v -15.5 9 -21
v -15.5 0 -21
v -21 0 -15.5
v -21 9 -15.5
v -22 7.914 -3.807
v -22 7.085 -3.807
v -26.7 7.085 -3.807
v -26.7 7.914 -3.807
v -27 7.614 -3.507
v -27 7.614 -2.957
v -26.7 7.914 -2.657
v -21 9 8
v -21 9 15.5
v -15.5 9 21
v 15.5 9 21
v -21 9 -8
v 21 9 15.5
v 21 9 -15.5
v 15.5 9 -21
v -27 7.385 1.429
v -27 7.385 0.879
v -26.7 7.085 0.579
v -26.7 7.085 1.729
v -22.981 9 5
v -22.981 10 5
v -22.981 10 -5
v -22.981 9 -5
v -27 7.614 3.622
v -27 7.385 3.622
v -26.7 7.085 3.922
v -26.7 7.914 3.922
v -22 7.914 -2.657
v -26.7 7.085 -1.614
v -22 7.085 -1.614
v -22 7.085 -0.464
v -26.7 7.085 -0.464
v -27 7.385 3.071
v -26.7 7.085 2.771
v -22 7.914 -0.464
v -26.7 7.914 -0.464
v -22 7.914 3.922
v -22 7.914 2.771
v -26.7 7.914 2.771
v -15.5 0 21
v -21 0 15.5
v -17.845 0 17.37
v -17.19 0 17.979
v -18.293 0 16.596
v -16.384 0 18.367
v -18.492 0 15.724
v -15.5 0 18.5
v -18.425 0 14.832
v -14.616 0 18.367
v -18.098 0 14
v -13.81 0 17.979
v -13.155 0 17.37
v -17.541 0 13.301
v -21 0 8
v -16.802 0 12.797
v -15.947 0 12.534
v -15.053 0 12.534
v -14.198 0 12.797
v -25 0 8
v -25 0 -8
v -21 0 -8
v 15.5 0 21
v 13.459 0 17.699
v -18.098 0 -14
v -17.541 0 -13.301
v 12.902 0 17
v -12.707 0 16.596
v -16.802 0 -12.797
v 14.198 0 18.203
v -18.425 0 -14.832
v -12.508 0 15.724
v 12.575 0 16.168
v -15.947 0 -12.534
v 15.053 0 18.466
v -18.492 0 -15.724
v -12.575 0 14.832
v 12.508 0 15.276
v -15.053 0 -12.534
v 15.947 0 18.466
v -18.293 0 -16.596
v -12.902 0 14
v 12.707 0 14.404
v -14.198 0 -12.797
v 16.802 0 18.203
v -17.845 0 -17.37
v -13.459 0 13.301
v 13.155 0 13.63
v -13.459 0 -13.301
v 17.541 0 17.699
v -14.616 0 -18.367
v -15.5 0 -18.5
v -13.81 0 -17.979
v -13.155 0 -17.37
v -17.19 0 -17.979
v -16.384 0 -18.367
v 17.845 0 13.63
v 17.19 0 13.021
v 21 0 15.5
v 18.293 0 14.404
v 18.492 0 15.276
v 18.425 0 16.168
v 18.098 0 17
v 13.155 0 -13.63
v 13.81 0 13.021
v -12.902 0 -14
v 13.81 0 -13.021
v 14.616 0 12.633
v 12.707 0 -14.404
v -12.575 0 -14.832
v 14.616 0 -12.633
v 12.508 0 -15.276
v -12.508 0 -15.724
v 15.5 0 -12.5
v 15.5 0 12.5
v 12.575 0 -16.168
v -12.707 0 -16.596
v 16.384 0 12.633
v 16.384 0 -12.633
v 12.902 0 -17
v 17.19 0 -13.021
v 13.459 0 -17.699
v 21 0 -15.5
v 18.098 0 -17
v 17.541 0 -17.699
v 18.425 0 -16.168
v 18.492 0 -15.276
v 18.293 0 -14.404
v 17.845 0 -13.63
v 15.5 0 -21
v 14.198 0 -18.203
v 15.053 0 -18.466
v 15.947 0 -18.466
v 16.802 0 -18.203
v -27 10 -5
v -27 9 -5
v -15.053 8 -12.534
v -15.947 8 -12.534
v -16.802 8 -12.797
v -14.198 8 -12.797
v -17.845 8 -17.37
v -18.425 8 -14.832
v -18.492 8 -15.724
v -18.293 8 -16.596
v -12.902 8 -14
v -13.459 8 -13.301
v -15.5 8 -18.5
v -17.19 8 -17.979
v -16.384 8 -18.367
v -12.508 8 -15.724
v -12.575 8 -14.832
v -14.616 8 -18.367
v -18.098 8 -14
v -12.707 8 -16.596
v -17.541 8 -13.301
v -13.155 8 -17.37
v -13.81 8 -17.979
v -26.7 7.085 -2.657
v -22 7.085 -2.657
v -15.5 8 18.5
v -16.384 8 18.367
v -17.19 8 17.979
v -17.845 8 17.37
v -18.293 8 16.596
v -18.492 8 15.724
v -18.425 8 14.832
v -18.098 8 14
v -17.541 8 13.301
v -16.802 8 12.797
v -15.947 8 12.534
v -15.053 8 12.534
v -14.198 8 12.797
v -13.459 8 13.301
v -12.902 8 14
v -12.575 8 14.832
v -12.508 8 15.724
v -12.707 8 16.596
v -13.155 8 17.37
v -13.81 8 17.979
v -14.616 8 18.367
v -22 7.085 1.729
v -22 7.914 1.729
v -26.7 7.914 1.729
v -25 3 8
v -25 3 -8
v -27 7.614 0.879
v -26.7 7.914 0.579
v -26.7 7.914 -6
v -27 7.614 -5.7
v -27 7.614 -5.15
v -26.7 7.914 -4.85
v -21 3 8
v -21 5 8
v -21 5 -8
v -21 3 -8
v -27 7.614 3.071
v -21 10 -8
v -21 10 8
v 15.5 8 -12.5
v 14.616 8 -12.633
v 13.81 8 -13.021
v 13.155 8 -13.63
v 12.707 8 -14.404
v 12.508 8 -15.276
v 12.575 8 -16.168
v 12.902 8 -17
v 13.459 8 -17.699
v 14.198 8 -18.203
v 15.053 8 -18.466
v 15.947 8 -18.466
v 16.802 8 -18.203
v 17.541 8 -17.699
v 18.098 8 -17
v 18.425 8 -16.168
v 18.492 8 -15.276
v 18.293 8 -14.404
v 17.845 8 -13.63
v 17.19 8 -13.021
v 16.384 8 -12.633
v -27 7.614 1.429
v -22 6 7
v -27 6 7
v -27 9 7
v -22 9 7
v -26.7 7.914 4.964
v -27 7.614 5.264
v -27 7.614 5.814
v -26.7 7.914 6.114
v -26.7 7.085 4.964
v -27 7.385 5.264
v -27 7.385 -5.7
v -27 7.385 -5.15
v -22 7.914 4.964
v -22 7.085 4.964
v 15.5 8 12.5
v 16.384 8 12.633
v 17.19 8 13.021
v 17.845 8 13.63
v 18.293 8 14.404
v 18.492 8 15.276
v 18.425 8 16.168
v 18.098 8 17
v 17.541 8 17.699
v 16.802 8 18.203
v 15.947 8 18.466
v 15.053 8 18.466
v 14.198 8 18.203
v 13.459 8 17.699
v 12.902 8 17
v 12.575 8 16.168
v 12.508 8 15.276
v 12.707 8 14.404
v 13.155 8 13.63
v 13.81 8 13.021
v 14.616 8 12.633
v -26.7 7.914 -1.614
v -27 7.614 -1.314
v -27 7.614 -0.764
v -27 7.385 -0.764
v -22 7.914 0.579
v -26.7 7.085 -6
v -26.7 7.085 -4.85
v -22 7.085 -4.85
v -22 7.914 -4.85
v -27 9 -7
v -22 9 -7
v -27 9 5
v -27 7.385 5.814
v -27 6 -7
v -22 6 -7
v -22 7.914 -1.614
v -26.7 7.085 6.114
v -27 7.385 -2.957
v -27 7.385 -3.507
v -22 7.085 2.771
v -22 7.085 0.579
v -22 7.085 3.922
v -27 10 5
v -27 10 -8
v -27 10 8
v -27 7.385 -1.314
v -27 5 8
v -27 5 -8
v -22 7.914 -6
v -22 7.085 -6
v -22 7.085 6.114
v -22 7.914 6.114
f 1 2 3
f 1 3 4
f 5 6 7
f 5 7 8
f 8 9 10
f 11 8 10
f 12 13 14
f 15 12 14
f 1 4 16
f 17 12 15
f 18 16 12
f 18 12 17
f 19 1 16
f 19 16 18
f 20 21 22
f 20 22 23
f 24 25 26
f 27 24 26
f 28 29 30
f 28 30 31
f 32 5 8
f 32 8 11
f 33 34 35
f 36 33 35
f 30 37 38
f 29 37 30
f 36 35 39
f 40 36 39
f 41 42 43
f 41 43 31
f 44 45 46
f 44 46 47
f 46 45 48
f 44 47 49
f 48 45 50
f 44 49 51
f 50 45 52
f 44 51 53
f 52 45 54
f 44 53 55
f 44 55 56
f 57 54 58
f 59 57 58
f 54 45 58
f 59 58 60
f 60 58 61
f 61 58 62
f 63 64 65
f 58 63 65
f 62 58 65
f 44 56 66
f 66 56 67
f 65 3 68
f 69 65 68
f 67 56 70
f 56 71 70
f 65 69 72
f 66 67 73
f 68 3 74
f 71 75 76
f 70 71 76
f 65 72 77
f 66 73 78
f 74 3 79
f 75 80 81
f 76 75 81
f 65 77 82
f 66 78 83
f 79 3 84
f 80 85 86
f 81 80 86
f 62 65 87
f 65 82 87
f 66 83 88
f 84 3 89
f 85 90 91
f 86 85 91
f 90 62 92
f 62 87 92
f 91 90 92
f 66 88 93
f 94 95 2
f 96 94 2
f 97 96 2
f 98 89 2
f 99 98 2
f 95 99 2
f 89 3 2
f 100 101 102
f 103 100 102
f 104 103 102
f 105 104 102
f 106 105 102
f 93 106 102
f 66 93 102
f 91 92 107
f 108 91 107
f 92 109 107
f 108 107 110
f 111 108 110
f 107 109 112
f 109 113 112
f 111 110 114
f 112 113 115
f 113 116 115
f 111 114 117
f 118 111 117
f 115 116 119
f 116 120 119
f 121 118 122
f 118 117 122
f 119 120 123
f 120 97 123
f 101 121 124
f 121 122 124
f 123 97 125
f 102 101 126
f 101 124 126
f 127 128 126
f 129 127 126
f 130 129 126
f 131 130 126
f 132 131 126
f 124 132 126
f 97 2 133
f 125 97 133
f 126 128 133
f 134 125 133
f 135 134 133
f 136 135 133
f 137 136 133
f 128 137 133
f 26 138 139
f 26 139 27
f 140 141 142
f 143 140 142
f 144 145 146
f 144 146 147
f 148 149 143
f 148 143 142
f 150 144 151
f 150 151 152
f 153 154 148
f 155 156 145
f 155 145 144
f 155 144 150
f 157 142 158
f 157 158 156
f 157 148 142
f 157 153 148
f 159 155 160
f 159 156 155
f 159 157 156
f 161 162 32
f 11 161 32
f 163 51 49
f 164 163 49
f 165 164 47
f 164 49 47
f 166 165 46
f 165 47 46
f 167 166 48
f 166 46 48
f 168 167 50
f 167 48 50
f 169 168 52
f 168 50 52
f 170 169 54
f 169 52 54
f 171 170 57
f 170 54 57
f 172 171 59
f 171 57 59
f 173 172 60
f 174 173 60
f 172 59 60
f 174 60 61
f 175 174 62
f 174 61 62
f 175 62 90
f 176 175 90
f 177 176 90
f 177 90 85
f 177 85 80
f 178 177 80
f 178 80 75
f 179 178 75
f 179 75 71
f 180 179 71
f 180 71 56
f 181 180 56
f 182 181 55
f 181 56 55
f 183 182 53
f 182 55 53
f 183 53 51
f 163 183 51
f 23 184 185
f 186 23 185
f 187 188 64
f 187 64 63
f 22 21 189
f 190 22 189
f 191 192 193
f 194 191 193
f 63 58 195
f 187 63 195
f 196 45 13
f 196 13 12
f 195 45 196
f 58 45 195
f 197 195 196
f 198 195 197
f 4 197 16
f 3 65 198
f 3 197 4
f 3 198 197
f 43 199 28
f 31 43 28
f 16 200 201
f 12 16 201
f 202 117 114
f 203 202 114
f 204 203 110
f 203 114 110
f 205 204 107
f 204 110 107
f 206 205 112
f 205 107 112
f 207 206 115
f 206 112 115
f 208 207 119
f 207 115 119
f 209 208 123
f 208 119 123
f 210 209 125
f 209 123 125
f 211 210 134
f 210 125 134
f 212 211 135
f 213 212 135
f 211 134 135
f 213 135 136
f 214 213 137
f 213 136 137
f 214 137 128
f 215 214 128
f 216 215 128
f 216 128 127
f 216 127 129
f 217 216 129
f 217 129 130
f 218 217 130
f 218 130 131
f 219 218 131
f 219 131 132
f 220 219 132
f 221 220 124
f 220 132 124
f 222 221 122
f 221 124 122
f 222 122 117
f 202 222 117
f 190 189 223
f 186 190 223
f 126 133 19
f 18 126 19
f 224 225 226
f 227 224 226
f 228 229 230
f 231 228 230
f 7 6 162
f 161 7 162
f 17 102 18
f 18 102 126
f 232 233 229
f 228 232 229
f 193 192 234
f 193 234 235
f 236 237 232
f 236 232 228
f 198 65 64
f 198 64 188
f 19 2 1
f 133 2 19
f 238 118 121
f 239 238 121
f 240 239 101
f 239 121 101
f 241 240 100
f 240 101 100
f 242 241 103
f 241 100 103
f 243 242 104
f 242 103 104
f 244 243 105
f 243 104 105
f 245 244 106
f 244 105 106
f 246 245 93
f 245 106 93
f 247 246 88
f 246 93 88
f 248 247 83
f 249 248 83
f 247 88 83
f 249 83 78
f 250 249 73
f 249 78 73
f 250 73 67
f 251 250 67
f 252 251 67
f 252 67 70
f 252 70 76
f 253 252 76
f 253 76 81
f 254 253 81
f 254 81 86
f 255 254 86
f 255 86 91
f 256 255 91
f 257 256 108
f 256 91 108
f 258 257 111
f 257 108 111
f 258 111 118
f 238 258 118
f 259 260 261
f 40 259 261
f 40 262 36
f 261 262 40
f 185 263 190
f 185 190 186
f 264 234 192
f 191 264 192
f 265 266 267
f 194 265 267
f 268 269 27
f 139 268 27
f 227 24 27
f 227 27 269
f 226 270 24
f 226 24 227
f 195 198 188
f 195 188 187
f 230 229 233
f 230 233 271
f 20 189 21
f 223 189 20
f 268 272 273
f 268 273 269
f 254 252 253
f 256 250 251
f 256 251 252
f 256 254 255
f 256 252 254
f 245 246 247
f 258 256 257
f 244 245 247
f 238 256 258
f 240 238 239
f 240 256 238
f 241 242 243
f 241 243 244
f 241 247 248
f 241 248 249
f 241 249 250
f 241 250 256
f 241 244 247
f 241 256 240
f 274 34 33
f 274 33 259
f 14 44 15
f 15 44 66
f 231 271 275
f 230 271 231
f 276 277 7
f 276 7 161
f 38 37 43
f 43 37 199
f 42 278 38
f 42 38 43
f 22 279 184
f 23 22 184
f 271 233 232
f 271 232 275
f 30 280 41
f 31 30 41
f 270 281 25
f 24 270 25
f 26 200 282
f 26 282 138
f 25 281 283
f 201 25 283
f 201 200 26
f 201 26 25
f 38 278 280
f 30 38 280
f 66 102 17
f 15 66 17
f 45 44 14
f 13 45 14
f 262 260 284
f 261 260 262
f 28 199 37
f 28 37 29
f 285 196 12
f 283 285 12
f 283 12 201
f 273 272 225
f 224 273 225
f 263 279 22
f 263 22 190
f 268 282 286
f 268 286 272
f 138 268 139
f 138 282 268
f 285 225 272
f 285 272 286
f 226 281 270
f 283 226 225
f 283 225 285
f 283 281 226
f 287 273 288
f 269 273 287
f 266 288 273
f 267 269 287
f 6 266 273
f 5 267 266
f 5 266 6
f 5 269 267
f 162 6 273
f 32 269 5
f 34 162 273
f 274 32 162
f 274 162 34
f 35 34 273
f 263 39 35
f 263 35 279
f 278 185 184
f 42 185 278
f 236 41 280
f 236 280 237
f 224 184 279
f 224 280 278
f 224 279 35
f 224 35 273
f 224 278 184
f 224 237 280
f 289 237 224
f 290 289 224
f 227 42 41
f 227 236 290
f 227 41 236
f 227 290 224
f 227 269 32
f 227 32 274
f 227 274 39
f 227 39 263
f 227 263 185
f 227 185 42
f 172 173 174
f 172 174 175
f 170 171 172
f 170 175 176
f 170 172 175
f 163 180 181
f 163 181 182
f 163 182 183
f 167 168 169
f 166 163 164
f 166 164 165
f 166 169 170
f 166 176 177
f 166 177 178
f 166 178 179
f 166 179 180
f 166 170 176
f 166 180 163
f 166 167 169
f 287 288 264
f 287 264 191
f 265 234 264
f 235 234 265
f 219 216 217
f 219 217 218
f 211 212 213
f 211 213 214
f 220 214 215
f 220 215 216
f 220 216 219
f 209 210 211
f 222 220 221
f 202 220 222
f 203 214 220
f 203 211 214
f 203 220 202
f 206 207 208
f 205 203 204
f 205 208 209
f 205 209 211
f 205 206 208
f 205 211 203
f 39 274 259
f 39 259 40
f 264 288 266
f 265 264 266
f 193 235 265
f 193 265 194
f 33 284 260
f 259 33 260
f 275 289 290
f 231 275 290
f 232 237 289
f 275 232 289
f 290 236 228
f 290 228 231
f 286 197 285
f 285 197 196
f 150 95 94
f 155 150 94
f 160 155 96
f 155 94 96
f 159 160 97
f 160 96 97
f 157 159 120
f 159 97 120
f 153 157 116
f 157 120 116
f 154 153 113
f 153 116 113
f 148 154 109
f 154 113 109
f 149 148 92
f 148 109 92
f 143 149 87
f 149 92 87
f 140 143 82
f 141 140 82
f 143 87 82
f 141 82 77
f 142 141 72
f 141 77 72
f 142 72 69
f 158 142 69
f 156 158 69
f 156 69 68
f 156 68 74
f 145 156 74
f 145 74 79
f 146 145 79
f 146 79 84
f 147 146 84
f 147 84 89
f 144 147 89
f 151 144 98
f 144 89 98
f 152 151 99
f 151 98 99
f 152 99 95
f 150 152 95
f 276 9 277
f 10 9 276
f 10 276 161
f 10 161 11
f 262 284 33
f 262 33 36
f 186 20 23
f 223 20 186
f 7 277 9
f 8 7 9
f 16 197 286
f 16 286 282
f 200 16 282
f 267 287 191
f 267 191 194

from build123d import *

# Parameters (mm, degrees)
SKETCH1_W           = 42
SKETCH1_H           = 42
NEMA_17_DEPTH       = 9
CHAMFER1_SIZE       = 5.5
SKETCH2_R           = 3
M6_BOLT_HOLES_DEPTH = 8
SKETCH3_W           = 16
SKETCH3_H           = 3
BOSS_EXTRUDE1_DEPTH = 4
SKETCH5_W           = 16
SKETCH5_H           = 5
BOSS_EXTRUDE2_DEPTH = 6
SKETCH6_W           = 14
SKETCH6_H           = 3
CUT_EXTRUDE1_DEPTH  = 5
SKETCH7_W           = 4.019368502
SKETCH7_H           = 10
CUT_EXTRUDE2_DEPTH  = 1
SKETCH8_W           = 1.150216319
SKETCH8_H           = 0.828591851
SKETCH8_W_2         = 1.150216318
BOSS_EXTRUDE3_DEPTH = 5
CHAMFER2_SIZE       = 0.3


with BuildPart() as part:
    # Sketch1 → Nema 17 (new body)
    with BuildSketch(Plane(origin=(0, 0, 0), x_dir=(1, 0, 0), z_dir=(0, 1, 0))):
        Rectangle(SKETCH1_W, SKETCH1_H)
    extrude(amount=NEMA_17_DEPTH)

    # Chamfer1
    chamfer1_edges = [part.edges().sort_by_distance(p)[0] for p in [
        (21, 4.5, 21),
        (-21, 4.5, 21),
        (-21, 4.5, -21),
        (21, 4.5, -21),
    ]]
    chamfer(chamfer1_edges, length=CHAMFER1_SIZE)

    # Sketch2 → M6 Bolt Holes (cut)
    with BuildSketch(Plane.XZ):
        with Locations(Location((-15.5, -15.5, 0), (0, 0, 270))):
            Circle(SKETCH2_R)
        with Locations(Location((15.5, -15.5, 0), (0, 0, 90))):
            Circle(SKETCH2_R)
        with Locations(Location((-15.5, 15.5, 0), (0, 0, 90))):
            Circle(SKETCH2_R)
        with Locations(Location((15.5, 15.5, 0), (0, 0, 270))):
            Circle(SKETCH2_R)
    extrude(amount=-M6_BOLT_HOLES_DEPTH, mode=Mode.SUBTRACT)

    # Sketch3 → Boss-Extrude1 (add)
    with BuildSketch(Plane.ZY.offset(21)):
        with Locations((0, 1.5)):
            Rectangle(SKETCH3_W, SKETCH3_H)
    extrude(amount=BOSS_EXTRUDE1_DEPTH)

    # Sketch5 → Boss-Extrude2 (add)
    with BuildSketch(Plane.ZY.offset(21)):
        with Locations((0, 7.5)):
            Rectangle(SKETCH5_W, SKETCH5_H)
    extrude(amount=BOSS_EXTRUDE2_DEPTH)

    # Sketch6 → Cut-Extrude1 (cut)
    with BuildSketch(Plane.ZY.offset(27)):
        with Locations((0, 7.5)):
            Rectangle(SKETCH6_W, SKETCH6_H)
    extrude(amount=-CUT_EXTRUDE1_DEPTH, mode=Mode.SUBTRACT)

    # Sketch7 → Cut-Extrude2 (cut)
    with BuildSketch(Plane(origin=(0, 10, 0), x_dir=(1, 0, 0), z_dir=(0, 1, 0))):
        with Locations((-24.990315749, 0)):
            Rectangle(SKETCH7_W, SKETCH7_H)
    extrude(amount=-CUT_EXTRUDE2_DEPTH, mode=Mode.SUBTRACT)

    # Sketch8 → Boss-Extrude3 (add)
    with BuildSketch(Plane.ZY.offset(22)):
        with Locations((5.539336093, 7.499295926)):
            Rectangle(SKETCH8_W, SKETCH8_H)
        with Locations((3.346490506, 7.499295926)):
            Rectangle(SKETCH8_W_2, SKETCH8_H)
        with Locations((1.15364492, 7.499295926)):
            Rectangle(SKETCH8_W, SKETCH8_H)
        with Locations((-1.039200668, 7.499295926)):
            Rectangle(SKETCH8_W, SKETCH8_H)
        with Locations((-3.232046254, 7.499295926)):
            Rectangle(SKETCH8_W_2, SKETCH8_H)
        with Locations((-5.42489184, 7.499295926)):
            Rectangle(SKETCH8_W, SKETCH8_H)
    extrude(amount=BOSS_EXTRUDE3_DEPTH)

    # Chamfer2
    chamfer2_edges = [part.edges().sort_by_distance(p)[0] for p in [
        (-27, 7.499295925, 4.964227933),
        (-27, 7.085, 5.539336093),
        (-27, 7.499295925, 6.114444252),
        (-27, 7.913591851, 5.539336093),
        (-27, 7.913591851, 3.346490506),
        (-27, 7.499295925, 2.771382347),
        (-27, 7.085, 3.346490506),
        (-27, 7.499295925, 3.921598665),
        (-27, 7.913591851, 1.153644919),
        (-27, 7.499295925, 0.57853676),
        (-27, 7.085, 1.153644919),
        (-27, 7.499295925, 1.728753079),
        (-27, 7.913591851, -1.039200667),
        (-27, 7.499295925, -1.614308827),
        (-27, 7.085, -1.039200667),
        (-27, 7.499295925, -0.464092508),
        (-27, 7.913591851, -3.232046254),
        (-27, 7.499295925, -3.807154413),
        (-27, 7.085, -3.232046254),
        (-27, 7.499295925, -2.656938095),
        (-27, 7.913591851, -5.424891841),
        (-27, 7.499295925, -6),
        (-27, 7.085, -5.424891841),
        (-27, 7.499295925, -4.849783681),
    ]]
    chamfer(chamfer2_edges, length=CHAMFER2_SIZE)


solid = part.part
